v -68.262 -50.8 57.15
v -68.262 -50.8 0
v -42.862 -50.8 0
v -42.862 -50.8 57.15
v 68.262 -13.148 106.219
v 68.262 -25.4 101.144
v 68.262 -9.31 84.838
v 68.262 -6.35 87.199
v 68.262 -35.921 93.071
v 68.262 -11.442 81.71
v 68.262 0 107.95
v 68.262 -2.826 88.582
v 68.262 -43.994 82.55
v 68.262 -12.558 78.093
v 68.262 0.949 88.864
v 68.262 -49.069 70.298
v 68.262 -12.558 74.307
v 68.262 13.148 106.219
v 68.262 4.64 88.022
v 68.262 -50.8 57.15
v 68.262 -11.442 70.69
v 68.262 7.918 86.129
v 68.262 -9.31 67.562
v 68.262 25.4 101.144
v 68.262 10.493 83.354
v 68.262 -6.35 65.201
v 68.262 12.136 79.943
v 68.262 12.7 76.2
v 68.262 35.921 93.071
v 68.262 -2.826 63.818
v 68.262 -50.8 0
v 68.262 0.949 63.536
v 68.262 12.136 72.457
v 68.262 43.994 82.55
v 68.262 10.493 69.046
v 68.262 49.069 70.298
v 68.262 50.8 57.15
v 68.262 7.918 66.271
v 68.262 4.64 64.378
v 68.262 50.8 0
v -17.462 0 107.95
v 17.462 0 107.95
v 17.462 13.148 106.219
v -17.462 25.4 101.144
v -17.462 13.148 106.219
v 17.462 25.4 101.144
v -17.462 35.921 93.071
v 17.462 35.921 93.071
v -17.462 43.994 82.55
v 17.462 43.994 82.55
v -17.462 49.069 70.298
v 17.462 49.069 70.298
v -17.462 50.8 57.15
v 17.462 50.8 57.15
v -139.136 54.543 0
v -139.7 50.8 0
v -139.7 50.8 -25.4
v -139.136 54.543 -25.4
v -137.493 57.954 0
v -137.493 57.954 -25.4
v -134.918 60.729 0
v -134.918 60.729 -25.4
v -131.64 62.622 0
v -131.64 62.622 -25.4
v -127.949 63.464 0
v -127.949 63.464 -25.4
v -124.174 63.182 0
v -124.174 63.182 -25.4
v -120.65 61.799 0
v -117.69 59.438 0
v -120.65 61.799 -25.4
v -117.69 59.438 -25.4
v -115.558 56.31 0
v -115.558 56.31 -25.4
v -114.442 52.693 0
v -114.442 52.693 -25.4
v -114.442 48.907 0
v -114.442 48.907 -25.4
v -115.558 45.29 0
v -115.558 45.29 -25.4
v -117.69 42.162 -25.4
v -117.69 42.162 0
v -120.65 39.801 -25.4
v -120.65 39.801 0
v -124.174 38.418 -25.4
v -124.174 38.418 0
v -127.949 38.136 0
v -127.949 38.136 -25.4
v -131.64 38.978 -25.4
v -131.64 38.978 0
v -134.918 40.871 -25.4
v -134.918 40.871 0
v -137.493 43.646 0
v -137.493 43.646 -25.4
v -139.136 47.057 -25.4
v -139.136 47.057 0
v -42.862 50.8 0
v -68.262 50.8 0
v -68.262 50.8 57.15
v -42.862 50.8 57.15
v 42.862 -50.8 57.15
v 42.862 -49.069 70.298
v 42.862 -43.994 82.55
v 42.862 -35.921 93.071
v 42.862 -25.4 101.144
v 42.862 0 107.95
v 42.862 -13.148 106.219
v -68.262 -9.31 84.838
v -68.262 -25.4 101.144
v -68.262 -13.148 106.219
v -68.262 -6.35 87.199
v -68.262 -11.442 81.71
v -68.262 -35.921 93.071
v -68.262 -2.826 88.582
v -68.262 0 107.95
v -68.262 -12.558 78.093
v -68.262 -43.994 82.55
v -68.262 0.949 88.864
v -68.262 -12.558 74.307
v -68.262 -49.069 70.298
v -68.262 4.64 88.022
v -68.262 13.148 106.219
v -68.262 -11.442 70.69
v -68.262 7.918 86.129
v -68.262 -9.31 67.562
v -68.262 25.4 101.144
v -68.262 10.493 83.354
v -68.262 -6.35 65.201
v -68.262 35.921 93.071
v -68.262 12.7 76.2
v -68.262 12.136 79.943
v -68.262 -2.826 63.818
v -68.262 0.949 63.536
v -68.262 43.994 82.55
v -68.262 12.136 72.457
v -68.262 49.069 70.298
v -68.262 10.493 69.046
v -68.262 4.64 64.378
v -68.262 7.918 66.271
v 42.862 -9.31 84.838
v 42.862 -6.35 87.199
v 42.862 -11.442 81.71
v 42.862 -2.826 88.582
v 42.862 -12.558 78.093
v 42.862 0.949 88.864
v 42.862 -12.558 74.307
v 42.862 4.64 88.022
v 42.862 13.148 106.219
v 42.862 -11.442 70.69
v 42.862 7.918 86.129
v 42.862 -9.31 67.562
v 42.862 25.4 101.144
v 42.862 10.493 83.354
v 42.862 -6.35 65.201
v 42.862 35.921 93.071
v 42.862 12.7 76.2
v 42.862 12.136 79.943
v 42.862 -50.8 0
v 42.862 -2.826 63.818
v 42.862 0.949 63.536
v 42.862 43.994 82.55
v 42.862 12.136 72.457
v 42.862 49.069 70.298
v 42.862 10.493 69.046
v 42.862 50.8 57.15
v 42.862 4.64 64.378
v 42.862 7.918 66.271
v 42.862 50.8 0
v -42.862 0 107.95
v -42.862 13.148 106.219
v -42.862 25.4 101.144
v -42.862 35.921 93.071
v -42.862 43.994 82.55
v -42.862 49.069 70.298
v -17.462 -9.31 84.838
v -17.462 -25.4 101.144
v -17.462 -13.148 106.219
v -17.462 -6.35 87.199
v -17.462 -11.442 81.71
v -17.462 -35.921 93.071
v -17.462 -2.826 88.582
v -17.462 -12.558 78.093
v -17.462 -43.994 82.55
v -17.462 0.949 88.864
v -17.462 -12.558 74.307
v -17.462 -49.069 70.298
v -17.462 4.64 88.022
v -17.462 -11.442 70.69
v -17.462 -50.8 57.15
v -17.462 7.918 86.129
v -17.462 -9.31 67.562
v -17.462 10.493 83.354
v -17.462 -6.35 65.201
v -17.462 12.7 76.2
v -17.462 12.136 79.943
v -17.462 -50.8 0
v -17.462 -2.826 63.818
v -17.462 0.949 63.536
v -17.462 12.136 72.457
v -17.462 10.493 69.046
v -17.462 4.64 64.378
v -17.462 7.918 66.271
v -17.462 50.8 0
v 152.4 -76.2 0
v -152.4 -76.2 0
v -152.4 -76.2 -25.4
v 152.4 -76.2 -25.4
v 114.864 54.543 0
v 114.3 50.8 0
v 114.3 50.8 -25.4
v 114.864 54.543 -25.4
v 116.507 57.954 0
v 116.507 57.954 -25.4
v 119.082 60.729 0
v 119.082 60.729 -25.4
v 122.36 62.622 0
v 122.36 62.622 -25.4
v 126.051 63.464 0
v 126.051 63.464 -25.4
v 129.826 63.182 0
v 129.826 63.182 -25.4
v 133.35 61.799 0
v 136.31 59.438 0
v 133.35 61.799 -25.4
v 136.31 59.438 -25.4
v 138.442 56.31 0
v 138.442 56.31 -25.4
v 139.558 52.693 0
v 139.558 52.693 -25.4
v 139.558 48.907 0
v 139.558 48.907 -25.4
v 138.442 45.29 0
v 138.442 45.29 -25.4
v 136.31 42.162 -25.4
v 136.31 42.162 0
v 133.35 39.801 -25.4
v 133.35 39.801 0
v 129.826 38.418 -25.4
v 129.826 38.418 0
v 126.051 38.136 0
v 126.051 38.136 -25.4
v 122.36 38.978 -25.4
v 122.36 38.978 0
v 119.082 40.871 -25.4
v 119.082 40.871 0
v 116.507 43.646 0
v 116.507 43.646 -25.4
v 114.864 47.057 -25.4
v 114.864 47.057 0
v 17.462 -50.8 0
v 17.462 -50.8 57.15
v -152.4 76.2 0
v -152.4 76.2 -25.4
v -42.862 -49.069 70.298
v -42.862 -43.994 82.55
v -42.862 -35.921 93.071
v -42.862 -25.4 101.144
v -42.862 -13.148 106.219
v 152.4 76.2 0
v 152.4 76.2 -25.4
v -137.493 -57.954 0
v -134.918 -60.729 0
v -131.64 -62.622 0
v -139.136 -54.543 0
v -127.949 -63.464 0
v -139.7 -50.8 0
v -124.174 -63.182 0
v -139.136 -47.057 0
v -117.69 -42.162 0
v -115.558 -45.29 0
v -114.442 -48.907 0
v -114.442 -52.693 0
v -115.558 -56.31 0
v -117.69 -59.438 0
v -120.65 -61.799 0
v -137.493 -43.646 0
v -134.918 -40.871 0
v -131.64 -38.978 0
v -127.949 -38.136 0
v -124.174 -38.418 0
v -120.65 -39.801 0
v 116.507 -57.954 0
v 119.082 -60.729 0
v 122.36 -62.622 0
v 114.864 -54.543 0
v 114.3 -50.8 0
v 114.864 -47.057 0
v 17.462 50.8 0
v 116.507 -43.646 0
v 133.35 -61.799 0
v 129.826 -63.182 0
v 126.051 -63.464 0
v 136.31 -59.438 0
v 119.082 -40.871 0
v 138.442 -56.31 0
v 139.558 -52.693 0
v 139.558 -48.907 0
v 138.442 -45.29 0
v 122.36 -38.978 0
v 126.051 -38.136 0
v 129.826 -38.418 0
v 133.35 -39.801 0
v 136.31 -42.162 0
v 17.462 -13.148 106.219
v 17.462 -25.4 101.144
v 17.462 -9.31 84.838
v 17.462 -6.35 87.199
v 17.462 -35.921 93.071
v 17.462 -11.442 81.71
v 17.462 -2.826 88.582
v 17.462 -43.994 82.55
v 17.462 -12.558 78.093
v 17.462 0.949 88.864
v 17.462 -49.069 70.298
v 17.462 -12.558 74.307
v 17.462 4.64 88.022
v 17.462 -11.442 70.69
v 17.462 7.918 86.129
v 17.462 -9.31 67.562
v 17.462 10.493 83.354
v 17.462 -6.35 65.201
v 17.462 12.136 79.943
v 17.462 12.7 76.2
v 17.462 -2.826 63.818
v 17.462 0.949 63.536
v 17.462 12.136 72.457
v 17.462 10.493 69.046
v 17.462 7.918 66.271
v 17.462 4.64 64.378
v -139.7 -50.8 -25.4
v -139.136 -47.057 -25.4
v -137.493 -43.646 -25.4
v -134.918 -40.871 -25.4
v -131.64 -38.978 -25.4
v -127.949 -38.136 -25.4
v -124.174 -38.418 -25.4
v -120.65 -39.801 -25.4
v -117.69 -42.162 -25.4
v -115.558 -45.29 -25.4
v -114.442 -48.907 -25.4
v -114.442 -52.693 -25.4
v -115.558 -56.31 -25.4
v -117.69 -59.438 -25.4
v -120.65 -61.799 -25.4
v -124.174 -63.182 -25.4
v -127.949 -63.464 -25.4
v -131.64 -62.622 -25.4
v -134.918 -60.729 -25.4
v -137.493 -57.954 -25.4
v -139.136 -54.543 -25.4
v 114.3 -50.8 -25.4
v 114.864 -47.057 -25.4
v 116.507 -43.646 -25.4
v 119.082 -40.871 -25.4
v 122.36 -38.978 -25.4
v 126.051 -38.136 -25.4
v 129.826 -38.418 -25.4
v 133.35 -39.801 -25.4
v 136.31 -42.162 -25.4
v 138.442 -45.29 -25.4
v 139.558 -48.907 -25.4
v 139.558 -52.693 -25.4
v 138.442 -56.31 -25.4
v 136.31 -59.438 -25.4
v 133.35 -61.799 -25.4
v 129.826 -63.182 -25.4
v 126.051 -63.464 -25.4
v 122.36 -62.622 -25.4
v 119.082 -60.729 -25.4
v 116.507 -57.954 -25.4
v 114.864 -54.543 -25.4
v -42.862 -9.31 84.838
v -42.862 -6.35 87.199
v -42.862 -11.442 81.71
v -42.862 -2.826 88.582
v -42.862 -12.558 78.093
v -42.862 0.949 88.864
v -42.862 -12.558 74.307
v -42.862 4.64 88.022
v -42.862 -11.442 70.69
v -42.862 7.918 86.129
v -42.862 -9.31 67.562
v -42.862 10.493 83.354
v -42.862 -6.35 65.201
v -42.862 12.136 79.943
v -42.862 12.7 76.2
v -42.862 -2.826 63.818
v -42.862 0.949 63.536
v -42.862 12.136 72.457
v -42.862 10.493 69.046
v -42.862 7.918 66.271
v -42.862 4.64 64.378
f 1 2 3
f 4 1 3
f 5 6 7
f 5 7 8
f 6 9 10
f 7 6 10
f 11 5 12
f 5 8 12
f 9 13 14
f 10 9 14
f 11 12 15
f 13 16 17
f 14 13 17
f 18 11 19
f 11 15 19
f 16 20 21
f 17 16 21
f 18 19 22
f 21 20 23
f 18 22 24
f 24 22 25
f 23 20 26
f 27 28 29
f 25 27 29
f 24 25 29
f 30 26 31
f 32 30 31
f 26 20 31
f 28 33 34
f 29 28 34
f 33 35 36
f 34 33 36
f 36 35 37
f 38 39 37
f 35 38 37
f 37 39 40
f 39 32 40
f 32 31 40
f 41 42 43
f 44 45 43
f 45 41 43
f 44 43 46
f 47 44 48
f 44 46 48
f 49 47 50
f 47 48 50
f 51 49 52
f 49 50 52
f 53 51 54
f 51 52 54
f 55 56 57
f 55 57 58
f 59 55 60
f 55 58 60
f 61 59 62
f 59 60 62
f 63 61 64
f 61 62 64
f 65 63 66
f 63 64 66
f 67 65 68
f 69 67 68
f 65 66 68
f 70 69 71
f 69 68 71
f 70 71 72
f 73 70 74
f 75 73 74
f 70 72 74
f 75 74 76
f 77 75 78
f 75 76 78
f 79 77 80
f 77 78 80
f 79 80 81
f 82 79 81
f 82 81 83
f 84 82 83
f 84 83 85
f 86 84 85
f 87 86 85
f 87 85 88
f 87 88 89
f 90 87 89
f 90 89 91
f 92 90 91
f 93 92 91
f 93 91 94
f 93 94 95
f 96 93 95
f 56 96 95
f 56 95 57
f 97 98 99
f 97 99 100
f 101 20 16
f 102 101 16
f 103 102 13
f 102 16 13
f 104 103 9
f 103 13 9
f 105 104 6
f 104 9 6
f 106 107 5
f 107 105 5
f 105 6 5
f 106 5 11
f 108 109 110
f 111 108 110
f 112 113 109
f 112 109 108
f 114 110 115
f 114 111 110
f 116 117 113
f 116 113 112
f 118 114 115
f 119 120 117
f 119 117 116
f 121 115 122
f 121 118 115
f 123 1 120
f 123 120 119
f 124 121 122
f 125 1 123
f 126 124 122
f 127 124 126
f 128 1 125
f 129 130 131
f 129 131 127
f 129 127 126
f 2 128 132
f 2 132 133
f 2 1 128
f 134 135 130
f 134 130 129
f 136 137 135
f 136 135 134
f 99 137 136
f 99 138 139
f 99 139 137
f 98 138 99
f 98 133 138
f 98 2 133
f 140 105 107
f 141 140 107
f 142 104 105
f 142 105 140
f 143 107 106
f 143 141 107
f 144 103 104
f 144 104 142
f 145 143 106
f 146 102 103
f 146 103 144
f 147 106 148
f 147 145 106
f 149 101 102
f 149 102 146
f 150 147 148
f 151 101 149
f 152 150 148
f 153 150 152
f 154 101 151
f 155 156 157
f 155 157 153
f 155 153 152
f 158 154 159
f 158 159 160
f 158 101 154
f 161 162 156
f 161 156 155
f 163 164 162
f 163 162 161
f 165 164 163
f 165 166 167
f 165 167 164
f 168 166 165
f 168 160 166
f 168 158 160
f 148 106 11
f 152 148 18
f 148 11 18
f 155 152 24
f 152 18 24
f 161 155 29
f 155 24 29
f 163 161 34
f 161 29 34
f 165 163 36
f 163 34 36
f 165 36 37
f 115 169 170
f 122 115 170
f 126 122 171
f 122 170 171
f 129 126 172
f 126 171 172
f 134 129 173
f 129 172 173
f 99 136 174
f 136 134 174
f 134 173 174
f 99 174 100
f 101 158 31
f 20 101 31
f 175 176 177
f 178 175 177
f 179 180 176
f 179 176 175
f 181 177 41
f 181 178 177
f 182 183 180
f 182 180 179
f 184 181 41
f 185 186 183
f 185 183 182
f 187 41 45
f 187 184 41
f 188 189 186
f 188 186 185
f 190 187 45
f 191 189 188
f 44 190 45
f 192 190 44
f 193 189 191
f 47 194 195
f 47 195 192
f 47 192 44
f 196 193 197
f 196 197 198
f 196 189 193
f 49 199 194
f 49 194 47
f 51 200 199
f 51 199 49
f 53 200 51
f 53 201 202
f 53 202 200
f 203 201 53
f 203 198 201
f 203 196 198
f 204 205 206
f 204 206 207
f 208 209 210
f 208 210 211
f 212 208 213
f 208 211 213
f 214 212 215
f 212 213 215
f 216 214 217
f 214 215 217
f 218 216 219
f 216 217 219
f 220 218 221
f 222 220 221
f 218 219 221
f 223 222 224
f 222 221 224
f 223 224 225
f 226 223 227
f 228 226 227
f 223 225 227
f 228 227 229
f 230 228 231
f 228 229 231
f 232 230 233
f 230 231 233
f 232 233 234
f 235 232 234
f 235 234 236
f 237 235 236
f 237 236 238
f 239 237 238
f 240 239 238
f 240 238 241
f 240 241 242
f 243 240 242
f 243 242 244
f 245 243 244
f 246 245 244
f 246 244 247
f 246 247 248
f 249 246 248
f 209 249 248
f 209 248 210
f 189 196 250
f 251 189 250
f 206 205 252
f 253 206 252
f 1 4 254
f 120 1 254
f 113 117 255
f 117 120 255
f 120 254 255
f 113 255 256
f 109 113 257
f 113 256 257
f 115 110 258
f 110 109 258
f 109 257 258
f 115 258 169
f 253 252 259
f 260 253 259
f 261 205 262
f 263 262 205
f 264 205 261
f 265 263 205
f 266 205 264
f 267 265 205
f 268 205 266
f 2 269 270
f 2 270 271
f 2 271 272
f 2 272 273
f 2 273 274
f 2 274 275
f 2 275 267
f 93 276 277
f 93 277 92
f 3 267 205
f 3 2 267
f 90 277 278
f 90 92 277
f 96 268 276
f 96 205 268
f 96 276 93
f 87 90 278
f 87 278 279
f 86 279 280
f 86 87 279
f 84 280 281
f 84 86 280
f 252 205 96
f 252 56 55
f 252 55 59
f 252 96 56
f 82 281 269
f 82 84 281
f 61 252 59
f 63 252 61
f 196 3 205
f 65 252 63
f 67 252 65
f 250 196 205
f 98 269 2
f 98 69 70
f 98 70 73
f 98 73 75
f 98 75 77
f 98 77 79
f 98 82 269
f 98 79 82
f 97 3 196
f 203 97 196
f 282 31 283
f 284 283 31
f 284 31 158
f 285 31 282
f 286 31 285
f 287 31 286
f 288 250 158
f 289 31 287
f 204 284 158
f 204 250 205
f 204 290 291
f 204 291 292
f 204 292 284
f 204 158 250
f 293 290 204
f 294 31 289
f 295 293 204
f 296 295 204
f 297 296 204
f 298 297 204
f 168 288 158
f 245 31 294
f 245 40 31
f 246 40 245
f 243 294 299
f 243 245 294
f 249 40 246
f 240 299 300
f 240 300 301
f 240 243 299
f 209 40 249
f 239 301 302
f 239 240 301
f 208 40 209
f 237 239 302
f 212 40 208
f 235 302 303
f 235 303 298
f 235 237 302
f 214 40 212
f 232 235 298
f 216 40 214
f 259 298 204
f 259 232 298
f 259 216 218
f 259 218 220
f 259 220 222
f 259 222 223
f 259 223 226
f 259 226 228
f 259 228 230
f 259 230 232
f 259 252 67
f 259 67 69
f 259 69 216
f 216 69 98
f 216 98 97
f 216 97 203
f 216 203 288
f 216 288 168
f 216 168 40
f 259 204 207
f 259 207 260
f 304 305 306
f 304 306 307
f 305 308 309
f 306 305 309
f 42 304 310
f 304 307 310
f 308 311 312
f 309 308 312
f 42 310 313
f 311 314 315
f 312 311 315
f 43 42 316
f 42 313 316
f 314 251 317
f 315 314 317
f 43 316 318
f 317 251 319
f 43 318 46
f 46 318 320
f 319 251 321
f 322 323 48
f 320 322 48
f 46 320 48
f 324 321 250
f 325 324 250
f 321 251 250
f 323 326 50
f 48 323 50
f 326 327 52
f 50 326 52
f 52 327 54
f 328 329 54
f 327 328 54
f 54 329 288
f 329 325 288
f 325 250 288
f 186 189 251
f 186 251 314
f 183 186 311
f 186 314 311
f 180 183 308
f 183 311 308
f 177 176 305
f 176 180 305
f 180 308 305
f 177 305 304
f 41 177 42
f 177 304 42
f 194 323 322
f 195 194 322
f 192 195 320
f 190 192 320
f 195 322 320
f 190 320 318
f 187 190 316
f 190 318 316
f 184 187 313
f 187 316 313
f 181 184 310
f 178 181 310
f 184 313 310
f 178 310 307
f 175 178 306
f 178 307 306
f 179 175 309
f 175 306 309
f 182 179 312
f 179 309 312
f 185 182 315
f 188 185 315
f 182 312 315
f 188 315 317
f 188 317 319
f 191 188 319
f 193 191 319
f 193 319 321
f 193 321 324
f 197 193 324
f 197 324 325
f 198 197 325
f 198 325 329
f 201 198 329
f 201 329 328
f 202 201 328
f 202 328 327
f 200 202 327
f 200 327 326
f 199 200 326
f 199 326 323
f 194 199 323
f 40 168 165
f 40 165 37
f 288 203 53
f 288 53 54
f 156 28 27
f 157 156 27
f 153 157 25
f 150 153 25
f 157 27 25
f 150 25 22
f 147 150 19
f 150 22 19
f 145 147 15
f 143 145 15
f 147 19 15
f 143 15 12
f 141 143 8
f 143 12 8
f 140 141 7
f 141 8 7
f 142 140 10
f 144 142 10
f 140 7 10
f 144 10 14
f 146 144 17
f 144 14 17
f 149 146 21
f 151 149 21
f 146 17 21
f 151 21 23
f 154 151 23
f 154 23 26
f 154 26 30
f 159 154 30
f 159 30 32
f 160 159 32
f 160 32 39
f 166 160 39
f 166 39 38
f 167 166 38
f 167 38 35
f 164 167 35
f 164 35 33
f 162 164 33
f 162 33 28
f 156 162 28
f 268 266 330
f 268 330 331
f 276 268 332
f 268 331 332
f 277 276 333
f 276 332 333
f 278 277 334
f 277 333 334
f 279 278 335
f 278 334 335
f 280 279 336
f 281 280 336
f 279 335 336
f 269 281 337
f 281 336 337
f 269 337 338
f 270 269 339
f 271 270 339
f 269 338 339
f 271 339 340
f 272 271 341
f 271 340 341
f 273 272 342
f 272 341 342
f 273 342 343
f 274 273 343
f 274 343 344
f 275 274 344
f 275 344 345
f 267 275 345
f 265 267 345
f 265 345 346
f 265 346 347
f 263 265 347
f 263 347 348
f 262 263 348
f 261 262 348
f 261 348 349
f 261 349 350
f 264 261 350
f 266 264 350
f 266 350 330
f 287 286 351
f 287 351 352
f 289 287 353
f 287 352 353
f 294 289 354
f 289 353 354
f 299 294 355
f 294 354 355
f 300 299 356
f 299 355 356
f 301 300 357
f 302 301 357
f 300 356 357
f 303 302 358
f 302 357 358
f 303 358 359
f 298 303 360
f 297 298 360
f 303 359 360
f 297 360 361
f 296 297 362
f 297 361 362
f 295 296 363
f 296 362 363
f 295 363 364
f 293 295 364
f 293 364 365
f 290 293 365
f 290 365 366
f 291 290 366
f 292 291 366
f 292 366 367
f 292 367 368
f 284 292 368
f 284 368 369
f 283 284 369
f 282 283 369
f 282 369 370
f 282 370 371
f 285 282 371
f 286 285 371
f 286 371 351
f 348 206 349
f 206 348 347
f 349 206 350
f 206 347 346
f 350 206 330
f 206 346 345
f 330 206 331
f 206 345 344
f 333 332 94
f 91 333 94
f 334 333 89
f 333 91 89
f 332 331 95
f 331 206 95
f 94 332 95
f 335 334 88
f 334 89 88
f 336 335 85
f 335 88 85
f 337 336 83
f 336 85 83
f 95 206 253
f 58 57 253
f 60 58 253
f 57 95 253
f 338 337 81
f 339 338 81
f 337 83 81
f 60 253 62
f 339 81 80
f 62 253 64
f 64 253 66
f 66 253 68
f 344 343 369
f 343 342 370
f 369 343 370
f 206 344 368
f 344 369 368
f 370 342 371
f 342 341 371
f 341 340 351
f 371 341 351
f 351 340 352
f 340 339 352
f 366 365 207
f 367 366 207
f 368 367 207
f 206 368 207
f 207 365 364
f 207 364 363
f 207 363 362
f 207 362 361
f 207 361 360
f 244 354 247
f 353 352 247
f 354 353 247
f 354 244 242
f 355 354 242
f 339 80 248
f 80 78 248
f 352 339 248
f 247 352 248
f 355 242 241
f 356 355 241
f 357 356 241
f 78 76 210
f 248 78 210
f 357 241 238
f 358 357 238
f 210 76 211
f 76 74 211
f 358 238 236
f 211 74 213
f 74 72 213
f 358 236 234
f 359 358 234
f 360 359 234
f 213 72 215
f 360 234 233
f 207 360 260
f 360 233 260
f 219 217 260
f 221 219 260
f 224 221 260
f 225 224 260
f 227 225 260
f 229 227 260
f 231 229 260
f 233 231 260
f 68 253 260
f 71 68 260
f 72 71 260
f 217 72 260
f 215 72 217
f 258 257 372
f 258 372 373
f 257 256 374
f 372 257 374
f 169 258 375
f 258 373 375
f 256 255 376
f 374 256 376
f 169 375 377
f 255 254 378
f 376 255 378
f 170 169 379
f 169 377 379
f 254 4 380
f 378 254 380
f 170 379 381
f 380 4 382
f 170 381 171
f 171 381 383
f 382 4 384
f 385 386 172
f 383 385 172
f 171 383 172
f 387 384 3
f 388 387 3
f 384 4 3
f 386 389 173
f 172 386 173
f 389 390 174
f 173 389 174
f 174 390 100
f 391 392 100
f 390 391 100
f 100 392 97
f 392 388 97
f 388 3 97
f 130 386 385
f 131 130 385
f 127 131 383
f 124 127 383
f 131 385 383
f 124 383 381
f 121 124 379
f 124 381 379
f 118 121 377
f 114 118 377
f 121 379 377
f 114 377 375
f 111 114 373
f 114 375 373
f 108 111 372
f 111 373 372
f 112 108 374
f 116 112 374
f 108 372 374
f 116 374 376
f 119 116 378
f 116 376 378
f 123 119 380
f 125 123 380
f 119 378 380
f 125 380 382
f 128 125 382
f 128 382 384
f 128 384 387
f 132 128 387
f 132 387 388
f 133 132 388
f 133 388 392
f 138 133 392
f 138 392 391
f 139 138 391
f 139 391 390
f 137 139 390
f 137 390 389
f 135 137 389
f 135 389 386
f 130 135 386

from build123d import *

# Parameters (mm, degrees)
F0_W     = 304.8
F0_H     = 152.4
F0_W_2   = 25.4
F0_H_2   = 101.6
F0_W_3   = 34.925
F1_DEPTH = 25.4
F2_DEPTH = 107.95
F4_DEPTH = 220.6635
F3_R     = 12.7
F5_DEPTH = 220.6635
F6_D     = 25.4


# Not quite as in the source:
# - a feature names something its author has since deleted; it is built from what else it names


with BuildPart() as f1:
    # F0 (on Top) → F1 (new body)
    with BuildSketch(Plane.XY):
        Rectangle(F0_W, F0_H)
        with Locations((-55.5625, 0)):
            Rectangle(F0_W_2, F0_H_2, mode=Mode.SUBTRACT)
        Rectangle(F0_W_3, F0_H_2, mode=Mode.SUBTRACT)
        with Locations((55.5625, 0)):
            Rectangle(F0_W_2, F0_H_2, mode=Mode.SUBTRACT)
        Rectangle(F0_W_3, F0_H_2)
        with Locations((-55.5625, 0)):
            Rectangle(F0_W_2, F0_H_2)
        with Locations((55.5625, 0)):
            Rectangle(F0_W_2, F0_H_2)
    extrude(amount=-F1_DEPTH)

    # F0 (on Top) → F2 (join)
    with BuildSketch(Plane.XY):
        with Locations((55.5625, 0)):
            Rectangle(F0_W_2, F0_H_2)
        Rectangle(F0_W_3, F0_H_2)
        with Locations((-55.5625, 0)):
            Rectangle(F0_W_2, F0_H_2)
    extrude(amount=F2_DEPTH)

    # F3 (on face) → F4 (cut, through all)
    with BuildSketch(Plane.YZ.offset(68.2625)):
        with BuildLine():
            Line((1e-10, 107.95), (-50.8, 107.95))
            Line((-50.8, 107.95), (-50.8, 57.15))
            ThreePointArc((-50.8, 57.15), (-35.9210244842, 93.0710244843), (1e-10, 107.95))
        make_face()
        with BuildLine():
            Line((50.8, 107.95), (1e-10, 107.95))
            ThreePointArc((1e-10, 107.95), (35.9210244843, 93.0710244842), (50.8, 57.15))
            Line((50.8, 57.15), (50.8, 107.95))
        make_face()
    extrude(amount=-F4_DEPTH, mode=Mode.SUBTRACT)

    # F3 (on face) → F5 (cut, through all)
    with BuildSketch(Plane.YZ.offset(68.2625)):
        with Locations((0, 76.2)):
            Circle(F3_R)
    extrude(amount=-F5_DEPTH, mode=Mode.SUBTRACT)

    # F6 (through all)
    with Locations(Plane.XY):
        with Locations((127, -50.8), (127, 50.8), (-127, 50.8), (-127, -50.8)):
            Hole(F6_D / 2)


solid = f1.part
